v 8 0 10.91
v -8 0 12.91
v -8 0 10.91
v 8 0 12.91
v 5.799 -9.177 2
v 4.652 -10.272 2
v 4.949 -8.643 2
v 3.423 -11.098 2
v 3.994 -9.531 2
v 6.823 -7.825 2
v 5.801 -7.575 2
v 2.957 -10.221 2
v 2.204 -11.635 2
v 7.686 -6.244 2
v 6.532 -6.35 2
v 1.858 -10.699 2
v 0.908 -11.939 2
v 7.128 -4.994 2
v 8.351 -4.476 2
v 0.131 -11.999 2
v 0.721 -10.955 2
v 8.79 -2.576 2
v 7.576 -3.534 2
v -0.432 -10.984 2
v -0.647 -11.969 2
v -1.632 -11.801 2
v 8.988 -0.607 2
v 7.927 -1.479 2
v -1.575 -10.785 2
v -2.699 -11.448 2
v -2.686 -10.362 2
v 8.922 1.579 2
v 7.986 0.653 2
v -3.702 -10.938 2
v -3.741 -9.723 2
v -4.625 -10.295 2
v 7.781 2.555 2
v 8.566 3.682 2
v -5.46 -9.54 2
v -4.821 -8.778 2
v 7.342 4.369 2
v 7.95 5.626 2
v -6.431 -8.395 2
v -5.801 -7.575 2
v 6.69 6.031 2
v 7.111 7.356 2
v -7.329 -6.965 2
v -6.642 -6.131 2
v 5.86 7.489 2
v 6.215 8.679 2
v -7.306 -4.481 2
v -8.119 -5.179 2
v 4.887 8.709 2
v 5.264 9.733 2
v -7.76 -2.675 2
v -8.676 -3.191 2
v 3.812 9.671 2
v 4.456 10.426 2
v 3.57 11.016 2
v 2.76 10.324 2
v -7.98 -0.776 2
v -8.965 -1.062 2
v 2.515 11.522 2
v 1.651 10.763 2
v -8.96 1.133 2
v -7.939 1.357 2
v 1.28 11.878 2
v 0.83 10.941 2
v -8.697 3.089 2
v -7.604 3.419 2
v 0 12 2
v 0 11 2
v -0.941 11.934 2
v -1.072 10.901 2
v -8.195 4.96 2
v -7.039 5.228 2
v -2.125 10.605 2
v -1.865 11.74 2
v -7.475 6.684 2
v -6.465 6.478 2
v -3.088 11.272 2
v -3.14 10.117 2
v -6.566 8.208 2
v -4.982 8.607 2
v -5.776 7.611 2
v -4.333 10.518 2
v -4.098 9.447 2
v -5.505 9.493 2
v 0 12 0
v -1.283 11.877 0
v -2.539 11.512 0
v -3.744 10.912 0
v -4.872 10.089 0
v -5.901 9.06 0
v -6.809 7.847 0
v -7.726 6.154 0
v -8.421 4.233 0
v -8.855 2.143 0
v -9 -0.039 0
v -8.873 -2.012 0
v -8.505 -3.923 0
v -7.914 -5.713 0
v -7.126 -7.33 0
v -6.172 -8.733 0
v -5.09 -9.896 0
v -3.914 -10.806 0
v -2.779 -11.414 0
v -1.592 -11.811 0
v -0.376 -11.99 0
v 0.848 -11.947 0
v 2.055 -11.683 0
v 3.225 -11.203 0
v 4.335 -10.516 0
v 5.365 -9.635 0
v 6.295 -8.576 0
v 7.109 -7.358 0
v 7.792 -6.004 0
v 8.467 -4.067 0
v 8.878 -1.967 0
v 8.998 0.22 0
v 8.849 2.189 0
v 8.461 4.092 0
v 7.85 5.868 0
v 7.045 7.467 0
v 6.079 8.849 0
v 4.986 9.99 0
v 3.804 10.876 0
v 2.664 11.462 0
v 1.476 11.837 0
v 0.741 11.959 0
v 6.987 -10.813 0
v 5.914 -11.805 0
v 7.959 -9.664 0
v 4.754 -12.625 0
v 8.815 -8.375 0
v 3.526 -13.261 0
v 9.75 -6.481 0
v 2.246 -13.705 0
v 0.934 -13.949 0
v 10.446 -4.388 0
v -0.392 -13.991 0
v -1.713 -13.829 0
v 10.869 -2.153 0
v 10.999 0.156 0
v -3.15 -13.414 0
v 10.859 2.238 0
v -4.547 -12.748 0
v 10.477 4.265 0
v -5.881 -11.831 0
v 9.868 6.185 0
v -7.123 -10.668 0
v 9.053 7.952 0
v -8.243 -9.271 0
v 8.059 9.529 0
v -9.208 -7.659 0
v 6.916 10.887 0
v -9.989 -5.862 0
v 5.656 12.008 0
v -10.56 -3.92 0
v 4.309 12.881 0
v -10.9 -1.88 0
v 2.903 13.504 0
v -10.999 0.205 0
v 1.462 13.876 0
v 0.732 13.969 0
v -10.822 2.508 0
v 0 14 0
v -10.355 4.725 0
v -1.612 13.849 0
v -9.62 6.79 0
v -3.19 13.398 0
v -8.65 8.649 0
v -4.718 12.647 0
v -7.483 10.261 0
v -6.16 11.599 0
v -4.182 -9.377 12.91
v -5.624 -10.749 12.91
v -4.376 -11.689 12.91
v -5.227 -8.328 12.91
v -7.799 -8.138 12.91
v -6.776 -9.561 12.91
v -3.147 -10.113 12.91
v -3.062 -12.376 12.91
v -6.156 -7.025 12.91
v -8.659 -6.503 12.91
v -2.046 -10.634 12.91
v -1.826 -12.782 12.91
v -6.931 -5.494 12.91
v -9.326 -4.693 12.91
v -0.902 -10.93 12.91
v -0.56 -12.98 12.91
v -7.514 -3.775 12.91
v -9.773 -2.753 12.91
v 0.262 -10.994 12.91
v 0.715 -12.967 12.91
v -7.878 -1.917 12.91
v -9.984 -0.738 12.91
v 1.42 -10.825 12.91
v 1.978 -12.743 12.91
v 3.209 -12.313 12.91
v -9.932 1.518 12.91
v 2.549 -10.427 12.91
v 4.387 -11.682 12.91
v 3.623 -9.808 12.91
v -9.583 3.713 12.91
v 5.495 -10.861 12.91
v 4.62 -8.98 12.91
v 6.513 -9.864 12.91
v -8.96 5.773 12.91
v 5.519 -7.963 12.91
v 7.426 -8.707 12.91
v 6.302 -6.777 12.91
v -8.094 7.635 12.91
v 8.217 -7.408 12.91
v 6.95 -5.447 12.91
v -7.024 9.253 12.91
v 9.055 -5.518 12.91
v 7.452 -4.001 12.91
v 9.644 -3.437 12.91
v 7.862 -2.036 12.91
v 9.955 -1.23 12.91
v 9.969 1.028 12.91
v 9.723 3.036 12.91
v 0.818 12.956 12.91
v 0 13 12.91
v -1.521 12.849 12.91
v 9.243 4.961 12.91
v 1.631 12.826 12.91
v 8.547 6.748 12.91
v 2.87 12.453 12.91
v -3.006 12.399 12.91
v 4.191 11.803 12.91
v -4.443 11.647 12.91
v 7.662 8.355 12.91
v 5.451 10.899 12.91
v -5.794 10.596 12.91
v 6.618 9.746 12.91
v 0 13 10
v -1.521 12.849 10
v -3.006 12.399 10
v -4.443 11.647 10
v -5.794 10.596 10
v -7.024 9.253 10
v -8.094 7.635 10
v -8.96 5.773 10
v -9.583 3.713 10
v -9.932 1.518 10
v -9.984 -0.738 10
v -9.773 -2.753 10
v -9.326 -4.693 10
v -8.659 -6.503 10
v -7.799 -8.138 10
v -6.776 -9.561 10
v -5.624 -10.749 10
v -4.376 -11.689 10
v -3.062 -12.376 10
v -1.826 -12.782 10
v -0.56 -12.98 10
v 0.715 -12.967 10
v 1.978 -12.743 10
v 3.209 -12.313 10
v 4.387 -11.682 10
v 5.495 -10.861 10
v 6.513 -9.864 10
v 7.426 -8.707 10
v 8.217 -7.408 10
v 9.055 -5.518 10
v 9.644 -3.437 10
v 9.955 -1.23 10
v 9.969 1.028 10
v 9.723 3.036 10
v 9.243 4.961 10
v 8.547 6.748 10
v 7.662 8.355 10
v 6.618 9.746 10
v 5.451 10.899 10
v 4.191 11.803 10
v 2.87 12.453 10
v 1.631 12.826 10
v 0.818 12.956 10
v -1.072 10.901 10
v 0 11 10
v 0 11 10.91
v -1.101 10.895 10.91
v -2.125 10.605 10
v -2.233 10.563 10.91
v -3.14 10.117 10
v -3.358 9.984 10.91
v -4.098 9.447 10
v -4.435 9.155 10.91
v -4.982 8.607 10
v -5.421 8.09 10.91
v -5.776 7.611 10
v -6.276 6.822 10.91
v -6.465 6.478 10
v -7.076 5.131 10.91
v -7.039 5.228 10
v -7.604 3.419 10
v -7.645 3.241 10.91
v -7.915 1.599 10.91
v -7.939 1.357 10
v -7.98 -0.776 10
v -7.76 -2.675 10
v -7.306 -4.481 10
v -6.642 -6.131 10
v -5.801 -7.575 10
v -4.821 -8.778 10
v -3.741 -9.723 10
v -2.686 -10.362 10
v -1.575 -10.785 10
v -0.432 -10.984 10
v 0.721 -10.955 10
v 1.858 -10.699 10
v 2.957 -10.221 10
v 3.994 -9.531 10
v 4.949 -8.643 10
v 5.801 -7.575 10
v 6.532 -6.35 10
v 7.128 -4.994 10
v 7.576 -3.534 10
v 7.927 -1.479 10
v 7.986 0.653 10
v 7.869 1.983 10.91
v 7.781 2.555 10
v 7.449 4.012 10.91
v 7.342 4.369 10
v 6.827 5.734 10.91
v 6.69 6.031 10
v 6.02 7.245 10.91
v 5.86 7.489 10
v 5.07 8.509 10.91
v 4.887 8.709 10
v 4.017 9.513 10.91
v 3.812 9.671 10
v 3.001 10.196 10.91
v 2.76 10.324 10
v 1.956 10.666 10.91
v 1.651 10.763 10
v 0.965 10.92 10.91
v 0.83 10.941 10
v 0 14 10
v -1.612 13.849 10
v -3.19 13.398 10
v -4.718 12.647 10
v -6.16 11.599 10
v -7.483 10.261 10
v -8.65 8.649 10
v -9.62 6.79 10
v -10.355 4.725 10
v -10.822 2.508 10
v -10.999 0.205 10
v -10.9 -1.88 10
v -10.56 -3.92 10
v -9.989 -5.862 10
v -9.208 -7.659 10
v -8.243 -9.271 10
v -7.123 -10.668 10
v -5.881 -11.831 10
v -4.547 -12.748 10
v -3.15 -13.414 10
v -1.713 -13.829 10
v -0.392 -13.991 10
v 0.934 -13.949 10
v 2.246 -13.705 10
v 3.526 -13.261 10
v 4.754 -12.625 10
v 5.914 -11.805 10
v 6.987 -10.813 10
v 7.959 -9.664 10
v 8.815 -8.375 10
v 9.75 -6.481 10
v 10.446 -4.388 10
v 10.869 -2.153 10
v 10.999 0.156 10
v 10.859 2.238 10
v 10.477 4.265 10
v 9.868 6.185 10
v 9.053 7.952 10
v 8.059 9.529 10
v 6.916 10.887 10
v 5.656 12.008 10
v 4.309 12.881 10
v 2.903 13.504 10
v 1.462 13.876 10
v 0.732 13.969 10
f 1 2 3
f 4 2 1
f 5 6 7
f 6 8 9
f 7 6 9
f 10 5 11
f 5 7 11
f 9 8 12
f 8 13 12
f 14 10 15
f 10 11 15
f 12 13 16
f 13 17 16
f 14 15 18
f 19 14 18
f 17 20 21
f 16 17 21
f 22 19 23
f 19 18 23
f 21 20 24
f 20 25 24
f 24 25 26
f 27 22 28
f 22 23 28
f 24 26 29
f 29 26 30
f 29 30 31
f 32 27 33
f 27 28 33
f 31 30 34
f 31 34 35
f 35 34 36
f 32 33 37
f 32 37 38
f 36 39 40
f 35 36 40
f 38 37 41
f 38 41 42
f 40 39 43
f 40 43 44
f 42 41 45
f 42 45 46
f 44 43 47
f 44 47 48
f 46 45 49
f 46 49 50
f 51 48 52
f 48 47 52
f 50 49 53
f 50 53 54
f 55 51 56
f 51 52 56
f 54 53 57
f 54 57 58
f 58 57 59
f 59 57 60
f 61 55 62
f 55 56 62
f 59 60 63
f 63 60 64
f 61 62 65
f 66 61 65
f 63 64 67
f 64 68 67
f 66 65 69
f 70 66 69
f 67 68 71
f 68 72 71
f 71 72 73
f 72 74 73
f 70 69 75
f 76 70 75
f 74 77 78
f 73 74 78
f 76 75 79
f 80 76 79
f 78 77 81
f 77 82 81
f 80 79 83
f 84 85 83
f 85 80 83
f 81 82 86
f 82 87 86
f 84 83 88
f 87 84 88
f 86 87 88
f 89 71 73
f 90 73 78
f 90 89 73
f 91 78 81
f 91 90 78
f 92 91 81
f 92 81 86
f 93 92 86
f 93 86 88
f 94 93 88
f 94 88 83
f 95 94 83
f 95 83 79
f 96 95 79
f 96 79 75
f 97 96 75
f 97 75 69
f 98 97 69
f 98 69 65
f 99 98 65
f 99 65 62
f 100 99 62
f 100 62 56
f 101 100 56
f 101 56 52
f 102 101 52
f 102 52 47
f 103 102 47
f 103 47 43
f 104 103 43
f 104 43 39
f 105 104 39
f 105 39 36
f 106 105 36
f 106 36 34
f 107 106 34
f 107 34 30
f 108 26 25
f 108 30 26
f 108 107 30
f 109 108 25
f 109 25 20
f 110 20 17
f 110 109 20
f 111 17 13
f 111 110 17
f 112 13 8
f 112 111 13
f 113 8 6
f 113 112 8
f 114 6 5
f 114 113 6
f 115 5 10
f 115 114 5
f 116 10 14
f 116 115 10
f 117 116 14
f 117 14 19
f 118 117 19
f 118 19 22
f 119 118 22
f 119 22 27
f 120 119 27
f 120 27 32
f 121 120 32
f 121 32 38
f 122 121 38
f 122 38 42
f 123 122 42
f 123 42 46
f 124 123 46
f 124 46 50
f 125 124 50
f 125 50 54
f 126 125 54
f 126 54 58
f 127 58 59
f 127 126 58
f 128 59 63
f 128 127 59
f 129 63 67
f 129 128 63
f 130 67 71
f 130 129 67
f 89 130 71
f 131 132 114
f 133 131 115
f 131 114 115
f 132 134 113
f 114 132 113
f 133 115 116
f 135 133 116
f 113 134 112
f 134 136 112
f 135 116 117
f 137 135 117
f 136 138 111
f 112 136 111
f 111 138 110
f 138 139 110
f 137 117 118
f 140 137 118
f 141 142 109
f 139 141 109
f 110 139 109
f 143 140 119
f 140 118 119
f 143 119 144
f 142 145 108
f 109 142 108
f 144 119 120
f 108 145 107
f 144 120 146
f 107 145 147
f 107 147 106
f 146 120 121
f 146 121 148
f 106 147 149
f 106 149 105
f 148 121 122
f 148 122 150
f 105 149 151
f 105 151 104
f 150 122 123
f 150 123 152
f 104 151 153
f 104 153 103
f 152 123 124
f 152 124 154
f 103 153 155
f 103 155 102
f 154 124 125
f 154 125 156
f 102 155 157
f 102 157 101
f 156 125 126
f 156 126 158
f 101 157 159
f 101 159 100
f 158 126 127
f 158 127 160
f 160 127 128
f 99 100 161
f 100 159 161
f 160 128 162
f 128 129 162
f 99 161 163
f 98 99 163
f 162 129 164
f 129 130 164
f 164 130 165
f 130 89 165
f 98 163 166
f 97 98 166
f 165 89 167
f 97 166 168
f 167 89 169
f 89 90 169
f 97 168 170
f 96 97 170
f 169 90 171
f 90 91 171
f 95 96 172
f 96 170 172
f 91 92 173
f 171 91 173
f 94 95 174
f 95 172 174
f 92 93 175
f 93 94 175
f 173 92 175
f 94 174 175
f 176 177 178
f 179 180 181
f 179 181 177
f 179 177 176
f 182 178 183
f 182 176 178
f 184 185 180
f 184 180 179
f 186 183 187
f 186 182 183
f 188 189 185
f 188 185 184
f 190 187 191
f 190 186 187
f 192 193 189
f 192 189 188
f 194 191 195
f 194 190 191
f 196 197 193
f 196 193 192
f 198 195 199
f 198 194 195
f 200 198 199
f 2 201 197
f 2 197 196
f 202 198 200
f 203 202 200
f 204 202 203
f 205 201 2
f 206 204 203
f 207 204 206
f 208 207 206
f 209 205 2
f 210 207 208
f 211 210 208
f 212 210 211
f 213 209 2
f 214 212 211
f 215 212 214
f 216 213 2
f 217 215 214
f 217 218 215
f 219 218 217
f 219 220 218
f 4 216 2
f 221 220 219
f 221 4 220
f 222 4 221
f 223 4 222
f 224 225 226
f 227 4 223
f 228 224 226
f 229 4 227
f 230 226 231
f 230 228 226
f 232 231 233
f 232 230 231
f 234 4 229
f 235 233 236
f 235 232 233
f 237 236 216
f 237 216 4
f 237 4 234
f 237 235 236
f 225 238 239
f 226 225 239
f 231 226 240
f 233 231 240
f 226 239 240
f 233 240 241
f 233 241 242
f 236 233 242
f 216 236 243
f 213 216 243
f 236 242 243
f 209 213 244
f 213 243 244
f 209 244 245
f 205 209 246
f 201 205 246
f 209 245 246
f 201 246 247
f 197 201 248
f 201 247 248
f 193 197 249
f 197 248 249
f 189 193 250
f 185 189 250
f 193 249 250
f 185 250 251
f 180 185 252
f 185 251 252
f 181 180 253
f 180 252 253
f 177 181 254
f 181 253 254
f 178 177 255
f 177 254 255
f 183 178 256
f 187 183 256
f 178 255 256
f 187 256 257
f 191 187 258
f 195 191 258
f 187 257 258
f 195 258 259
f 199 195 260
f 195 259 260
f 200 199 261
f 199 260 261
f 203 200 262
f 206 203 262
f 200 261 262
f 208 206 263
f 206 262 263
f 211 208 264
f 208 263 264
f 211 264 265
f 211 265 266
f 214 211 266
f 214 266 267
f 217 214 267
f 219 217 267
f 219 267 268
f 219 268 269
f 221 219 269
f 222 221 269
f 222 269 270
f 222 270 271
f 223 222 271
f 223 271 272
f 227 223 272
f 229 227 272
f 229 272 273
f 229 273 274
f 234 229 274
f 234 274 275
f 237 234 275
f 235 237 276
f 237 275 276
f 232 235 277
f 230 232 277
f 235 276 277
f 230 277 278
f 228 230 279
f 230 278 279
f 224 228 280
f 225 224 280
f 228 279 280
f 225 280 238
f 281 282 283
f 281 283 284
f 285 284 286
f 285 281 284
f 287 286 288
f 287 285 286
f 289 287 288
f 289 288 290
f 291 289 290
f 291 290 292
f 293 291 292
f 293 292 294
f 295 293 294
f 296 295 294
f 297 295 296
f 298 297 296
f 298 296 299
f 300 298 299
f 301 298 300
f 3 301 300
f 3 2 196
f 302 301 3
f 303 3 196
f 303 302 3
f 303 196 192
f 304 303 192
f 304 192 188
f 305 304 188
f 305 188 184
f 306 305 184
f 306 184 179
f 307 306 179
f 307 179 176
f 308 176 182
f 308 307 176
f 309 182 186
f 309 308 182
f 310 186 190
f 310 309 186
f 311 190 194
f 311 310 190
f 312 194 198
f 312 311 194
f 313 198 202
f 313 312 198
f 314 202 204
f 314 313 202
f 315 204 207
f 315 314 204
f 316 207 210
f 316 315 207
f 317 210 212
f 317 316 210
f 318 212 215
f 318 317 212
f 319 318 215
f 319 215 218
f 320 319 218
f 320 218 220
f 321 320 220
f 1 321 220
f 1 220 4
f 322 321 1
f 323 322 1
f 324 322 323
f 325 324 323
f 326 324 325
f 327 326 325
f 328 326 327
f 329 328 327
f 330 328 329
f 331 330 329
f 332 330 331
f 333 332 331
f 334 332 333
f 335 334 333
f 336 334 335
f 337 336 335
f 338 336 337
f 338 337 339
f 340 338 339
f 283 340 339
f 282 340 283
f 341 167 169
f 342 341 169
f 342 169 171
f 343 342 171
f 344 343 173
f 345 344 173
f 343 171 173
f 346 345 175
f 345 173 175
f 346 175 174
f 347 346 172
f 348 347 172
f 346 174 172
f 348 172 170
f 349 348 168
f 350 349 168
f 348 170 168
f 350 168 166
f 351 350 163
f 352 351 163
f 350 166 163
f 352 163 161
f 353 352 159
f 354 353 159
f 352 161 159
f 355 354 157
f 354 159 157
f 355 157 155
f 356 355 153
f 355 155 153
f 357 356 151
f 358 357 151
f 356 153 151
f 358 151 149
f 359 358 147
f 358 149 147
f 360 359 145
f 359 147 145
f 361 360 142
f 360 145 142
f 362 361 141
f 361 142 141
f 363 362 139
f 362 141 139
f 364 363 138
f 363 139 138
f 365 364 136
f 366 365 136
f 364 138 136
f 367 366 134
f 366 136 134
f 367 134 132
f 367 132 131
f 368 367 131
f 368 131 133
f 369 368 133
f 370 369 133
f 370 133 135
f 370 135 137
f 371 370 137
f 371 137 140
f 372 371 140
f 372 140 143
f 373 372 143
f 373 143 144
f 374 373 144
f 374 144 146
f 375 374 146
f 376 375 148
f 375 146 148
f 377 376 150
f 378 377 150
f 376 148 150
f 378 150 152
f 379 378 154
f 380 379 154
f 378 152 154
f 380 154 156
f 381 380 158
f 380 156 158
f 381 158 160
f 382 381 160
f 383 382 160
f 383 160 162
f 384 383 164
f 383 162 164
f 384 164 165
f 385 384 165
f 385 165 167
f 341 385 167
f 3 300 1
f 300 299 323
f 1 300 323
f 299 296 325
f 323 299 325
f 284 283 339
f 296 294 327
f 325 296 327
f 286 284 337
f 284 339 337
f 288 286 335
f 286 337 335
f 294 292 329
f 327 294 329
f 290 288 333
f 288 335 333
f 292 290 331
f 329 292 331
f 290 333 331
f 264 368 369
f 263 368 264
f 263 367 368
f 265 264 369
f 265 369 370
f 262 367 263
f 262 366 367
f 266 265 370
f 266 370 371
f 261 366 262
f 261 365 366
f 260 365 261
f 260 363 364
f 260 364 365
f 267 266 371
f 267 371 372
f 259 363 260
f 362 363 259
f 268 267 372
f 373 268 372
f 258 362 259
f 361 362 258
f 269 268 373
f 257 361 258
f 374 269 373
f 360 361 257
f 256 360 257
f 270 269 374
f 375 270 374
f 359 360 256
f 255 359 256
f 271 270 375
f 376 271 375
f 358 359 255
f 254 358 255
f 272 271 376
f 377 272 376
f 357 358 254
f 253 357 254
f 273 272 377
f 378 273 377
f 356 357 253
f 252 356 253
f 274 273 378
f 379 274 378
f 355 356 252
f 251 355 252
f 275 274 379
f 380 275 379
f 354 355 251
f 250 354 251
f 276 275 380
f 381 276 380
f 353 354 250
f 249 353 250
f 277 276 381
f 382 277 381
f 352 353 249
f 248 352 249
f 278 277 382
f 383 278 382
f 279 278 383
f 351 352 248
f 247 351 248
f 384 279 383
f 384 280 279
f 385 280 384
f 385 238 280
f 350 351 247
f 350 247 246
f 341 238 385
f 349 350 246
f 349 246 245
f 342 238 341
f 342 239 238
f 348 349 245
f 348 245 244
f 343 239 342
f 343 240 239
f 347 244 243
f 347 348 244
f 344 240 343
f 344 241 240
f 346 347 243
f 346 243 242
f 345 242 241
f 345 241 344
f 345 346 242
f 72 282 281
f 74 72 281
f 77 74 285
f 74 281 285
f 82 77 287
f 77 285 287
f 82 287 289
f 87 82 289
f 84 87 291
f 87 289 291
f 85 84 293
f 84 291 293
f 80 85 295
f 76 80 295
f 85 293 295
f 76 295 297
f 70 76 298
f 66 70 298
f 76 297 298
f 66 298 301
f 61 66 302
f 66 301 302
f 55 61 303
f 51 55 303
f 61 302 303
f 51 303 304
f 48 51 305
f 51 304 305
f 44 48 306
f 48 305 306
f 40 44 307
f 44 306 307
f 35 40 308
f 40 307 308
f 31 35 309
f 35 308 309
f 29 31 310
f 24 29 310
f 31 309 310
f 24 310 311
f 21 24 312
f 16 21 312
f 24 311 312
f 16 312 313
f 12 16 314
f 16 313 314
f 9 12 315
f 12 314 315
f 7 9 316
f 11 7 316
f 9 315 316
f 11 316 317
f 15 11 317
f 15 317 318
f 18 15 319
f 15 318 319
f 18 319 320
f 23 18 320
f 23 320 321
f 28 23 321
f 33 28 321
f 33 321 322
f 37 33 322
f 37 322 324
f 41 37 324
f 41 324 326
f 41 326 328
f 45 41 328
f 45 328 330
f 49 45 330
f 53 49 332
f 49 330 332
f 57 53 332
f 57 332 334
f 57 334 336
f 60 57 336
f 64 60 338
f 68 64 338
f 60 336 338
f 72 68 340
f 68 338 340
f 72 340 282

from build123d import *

# Parameters (mm, degrees)
CROQUIS1_RX                  = 14
CROQUIS1_RY                  = 11
CROQUIS1_RX_2                = 12
CROQUIS1_RY_2                = 9
SALIENTE_EXTRUIR1_DEPTH      = 10
CROQUIS2_RX                  = 13
CROQUIS2_RY                  = 10
CROQUIS2_RX_2                = 11
CROQUIS2_RY_2                = 8
SALIENTE_EXTRUIR3_DEPTH      = 2.90966046
SALIENTE_EXTRUIR3_DEPTH_BACK = 8
SALIENTE_EXTRUIR4_DEPTH      = 2


with BuildPart() as part:
    # Croquis1 → Saliente-Extruir1 (new body)
    with BuildSketch(Plane.XY):
        with Locations(Location((0, 0), (0, 0, 90))):
            Ellipse(CROQUIS1_RX, CROQUIS1_RY)
        with Locations(Location((0, 0), (0, 0, 90))):
            Ellipse(CROQUIS1_RX_2, CROQUIS1_RY_2, mode=Mode.SUBTRACT)
    extrude(amount=SALIENTE_EXTRUIR1_DEPTH)

    # Croquis2 → Saliente-Extruir3 (add, two sides)
    with BuildSketch(Plane.XY.offset(10)) as saliente_extruir3_sk:
        with Locations(Location((0, 0), (0, 0, 90))):
            Ellipse(CROQUIS2_RX, CROQUIS2_RY)
        with Locations(Location((0, 0), (0, 0, 90))):
            Ellipse(CROQUIS2_RX_2, CROQUIS2_RY_2, mode=Mode.SUBTRACT)
    extrude(amount=SALIENTE_EXTRUIR3_DEPTH)
    extrude(saliente_extruir3_sk.sketch, amount=-SALIENTE_EXTRUIR3_DEPTH_BACK)

    # Croquis4 → Saliente-Extruir4 (add)
    with BuildSketch(Plane.XY.offset(12.90966046)):
        with BuildLine():
            Line((-8, 0), (8, 0))
            add(Edge.make_bspline(
                [(8, 0), (8, 11), (0, 11), (-8, 11), (-8, 0)],
                knots=[4.71238898, 4.71238898, 4.71238898, 6.283185307, 6.283185307, 7.853981634, 7.853981634, 7.853981634], degree=2, weights=[1, 0.707106781, 1, 0.707106781, 1]))
        make_face()
    extrude(amount=-SALIENTE_EXTRUIR4_DEPTH)


solid = part.part
